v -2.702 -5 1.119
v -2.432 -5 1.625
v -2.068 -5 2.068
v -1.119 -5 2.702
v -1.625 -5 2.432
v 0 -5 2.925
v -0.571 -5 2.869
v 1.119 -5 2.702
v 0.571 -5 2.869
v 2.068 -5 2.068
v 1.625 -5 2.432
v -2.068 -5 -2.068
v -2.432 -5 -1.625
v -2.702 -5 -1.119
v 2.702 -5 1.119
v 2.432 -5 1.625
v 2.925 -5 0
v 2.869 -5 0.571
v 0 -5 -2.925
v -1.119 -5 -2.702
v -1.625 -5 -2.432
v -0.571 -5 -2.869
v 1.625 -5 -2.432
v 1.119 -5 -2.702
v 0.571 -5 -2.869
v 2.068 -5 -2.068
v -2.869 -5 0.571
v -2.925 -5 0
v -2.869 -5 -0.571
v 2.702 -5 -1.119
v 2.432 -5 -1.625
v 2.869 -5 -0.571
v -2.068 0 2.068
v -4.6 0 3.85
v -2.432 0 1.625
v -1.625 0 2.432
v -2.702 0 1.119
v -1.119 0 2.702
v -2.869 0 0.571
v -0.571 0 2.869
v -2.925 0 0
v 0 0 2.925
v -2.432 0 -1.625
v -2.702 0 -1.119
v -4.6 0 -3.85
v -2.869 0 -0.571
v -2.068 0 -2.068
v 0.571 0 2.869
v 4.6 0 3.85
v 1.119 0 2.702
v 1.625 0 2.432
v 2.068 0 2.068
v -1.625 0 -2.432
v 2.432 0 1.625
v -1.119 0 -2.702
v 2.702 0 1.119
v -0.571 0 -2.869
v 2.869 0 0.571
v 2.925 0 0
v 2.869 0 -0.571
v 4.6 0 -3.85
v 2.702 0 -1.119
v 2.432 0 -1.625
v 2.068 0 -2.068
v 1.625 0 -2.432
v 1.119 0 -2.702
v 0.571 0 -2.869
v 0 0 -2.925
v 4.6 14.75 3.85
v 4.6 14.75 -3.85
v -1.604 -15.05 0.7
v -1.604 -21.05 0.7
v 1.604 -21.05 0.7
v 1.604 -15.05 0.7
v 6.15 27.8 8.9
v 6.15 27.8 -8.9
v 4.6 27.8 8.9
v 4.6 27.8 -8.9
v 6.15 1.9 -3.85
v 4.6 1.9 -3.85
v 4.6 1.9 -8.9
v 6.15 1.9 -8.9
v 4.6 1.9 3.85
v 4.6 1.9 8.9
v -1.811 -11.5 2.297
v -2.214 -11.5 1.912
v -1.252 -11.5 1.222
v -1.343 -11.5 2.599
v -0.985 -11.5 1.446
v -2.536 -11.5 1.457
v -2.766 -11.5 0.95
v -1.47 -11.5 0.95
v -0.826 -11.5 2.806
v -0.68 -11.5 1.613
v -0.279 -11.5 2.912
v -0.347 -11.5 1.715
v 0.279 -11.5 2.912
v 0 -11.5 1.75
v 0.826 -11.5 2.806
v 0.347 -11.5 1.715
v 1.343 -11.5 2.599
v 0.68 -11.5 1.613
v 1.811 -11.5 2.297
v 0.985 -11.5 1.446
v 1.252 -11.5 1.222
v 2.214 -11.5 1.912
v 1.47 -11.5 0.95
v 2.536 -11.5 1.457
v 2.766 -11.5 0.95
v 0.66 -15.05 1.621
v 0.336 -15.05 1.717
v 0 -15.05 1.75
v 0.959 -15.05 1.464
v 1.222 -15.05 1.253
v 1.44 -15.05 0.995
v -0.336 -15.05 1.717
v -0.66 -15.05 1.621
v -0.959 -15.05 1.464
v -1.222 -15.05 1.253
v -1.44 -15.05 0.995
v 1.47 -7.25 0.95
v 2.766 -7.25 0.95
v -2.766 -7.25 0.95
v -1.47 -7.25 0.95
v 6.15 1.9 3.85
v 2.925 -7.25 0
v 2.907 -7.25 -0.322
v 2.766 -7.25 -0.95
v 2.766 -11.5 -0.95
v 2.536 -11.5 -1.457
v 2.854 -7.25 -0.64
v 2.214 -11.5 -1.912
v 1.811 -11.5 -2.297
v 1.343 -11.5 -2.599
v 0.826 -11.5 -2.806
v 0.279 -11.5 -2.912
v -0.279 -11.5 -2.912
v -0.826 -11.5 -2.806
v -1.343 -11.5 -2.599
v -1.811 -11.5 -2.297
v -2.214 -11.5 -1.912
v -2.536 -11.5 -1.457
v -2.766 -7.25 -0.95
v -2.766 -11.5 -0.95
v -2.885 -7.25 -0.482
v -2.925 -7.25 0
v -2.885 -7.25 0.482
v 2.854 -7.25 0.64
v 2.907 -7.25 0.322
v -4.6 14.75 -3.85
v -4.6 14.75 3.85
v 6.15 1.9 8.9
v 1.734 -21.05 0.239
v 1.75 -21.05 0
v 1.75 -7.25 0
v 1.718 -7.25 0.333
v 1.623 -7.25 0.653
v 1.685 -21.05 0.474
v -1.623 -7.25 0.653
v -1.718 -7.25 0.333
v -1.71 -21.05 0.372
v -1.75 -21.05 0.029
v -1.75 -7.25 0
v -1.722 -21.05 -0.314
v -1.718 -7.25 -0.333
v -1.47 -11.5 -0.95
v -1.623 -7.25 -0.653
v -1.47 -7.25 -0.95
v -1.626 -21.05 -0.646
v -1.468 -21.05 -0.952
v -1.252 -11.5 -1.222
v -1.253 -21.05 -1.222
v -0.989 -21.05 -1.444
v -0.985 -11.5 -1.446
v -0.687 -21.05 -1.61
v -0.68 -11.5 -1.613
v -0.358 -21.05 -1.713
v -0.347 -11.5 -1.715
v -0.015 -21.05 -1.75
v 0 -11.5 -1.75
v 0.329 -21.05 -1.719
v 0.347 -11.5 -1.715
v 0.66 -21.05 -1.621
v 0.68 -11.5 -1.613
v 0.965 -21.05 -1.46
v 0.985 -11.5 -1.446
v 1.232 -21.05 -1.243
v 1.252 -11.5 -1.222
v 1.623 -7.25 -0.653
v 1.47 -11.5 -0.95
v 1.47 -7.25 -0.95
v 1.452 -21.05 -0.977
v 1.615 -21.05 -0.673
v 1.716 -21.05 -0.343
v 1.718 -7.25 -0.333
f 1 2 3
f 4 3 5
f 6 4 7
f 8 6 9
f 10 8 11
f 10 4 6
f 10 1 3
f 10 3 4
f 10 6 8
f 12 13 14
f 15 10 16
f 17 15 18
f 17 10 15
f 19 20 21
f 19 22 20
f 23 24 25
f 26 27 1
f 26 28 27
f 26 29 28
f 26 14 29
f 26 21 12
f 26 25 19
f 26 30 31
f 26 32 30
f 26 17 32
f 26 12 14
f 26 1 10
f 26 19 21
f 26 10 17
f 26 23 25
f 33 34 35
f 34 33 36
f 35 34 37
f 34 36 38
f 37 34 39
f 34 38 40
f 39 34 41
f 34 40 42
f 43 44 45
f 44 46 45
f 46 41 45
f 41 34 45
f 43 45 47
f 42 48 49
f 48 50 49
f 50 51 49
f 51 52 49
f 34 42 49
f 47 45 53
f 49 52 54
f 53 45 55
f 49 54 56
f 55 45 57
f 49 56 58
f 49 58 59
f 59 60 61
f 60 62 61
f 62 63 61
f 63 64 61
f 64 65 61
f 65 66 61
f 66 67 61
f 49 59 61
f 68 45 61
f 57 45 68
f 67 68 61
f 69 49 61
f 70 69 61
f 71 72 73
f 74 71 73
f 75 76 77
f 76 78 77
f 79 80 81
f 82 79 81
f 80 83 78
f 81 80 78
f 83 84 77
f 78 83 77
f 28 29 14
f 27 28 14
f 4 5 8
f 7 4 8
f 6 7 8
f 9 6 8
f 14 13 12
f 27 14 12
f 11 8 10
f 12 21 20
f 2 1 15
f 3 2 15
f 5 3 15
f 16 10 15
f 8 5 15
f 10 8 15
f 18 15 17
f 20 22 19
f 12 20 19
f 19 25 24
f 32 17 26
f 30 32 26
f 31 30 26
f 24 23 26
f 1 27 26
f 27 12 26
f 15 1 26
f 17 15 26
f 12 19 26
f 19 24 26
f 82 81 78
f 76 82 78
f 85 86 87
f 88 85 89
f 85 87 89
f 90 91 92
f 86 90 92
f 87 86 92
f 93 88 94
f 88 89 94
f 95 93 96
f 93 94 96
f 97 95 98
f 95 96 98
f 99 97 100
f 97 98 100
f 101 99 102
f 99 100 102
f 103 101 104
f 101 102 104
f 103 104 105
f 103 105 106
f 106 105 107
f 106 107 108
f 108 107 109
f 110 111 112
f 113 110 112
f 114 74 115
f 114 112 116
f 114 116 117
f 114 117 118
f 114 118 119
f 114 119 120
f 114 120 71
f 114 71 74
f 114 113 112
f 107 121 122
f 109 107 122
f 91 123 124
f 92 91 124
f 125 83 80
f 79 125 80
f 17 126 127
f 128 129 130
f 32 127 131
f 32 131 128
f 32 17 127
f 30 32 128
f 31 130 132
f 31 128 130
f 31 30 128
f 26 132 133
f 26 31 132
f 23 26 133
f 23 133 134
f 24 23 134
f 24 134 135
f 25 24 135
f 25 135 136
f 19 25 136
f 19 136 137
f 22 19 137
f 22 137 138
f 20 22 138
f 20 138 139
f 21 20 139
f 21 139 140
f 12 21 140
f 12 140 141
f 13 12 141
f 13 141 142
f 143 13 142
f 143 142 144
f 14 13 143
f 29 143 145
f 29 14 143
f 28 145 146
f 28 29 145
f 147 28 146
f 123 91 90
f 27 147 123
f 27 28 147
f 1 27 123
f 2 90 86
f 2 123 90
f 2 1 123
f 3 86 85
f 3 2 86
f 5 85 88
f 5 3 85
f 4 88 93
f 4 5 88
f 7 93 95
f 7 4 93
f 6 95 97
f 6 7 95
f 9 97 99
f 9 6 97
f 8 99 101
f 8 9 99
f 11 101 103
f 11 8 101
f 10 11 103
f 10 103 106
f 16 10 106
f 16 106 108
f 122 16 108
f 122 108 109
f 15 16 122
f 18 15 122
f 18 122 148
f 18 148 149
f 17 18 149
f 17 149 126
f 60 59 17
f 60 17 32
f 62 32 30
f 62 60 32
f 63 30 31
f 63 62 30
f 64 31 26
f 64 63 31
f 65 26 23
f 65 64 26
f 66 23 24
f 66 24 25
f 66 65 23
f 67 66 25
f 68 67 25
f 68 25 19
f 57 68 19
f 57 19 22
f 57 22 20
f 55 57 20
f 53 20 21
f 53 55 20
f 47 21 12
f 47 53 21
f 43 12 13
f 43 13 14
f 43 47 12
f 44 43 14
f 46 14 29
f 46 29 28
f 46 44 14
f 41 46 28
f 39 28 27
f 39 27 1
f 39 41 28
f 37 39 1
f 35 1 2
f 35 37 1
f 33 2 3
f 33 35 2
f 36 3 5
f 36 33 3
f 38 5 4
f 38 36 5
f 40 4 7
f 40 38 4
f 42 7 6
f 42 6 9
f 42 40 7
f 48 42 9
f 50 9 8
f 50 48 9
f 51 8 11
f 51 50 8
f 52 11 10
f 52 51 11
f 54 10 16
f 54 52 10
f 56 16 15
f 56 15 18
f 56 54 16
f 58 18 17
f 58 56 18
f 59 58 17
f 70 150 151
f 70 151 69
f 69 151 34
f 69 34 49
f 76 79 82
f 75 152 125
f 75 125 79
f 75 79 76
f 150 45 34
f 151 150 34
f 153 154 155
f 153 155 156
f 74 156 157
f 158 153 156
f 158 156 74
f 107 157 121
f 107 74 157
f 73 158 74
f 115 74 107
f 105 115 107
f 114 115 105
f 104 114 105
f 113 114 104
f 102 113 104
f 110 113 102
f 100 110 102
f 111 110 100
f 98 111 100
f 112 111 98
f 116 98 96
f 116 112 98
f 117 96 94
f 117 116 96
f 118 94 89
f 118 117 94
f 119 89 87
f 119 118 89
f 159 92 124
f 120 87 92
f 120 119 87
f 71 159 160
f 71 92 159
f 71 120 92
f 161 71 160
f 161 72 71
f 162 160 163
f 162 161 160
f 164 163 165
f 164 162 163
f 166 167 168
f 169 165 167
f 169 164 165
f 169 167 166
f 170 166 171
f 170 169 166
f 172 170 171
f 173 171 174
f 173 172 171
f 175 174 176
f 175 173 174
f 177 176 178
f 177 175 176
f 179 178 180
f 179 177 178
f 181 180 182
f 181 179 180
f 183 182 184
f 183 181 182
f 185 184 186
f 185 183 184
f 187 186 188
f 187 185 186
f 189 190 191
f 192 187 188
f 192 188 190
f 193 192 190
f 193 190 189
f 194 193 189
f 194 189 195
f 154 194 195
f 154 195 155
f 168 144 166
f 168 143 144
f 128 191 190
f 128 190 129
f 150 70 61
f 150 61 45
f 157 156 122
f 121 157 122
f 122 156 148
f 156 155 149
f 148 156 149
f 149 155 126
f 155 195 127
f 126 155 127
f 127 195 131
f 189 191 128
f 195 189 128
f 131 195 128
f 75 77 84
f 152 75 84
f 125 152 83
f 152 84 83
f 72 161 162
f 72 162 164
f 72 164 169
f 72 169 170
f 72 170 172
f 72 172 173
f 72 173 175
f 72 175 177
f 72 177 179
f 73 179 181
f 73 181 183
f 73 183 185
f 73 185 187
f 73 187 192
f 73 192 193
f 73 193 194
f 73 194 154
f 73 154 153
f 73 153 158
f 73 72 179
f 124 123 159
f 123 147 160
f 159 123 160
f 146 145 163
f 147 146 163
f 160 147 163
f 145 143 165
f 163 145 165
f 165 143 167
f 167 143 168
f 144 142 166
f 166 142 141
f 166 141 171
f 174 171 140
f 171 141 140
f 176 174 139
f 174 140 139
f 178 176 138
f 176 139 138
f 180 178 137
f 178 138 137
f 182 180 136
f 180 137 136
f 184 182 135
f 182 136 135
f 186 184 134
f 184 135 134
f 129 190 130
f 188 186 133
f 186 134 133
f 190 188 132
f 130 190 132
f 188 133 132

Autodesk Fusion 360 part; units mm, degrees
sketch "Profile" plane through (0, 0, 0) normal (0, 1, 0) x (1, 0, 0)
  line L0 (4.6, 3.85) -> (-4.6, 3.85)
  line L1 (-4.6, 3.85) -> (-4.6, -3.85)
  line L2 (-4.6, -3.85) -> (4.6, -3.85)
  line L3 (4.6, -3.85) -> (4.6, 3.85)
  line L4 (4.6, 3.85) -> (-4.6, -3.85) construction
  line L5 (-4.6, 3.85) -> (4.6, -3.85) construction
  circle A0 centre (0, 0) radius 2.925
  line L6 (2.235, -1.8869) -> (2.235, 1.8869)
  line L7 (0, 0) -> (0, 6.159) construction
  line L8 (-2.235, -1.8869) -> (-2.235, 1.8869)
  line L9 (-2.7664, -0.95) -> (2.7664, -0.95)
  line L10 (0, 0) -> (1.3963, 0) construction
  line L11 (-2.7664, 0.95) -> (2.7664, 0.95)
  dimension "d1" = 9.2
  dimension "d2" = 7.7
  dimension "d3" = 5.85
  dimension "d17" = 2.235
  dimension "d18" = 0.95
extrude "Extrude1" add sketch "Profile" along normal blind 14.75 contours L0 L1 L2 L3 | A0 L6 L9 L11 | A0 L6 L11 | A0 L6 L9 | A0 L6 L8 L11 | L6 L8 L9 L11 | A0 L6 L8 L9 | A0 L8 L11 | A0 L8 L9 L11 | A0 L8 L9 makes body 1
extrude "Extrude2" add sketch "Profile" against normal blind 5 contours A0 L6 L9 L11 | A0 L6 L11 | A0 L6 L9 | A0 L6 L8 L11 | L6 L8 L9 L11 | A0 L6 L8 L9 | A0 L8 L11 | A0 L8 L9 L11 | A0 L8 L9 bodies 1
extrude "Extrude3" add sketch "Profile" against normal blind 6.5 from surface at -5 separate body contours A0 L6 L11 | A0 L6 L9 | A0 L6 L8 L11 | A0 L6 L8 L9 | A0 L8 L11 | A0 L8 L9 makes body 2 at (1.1749, -9.3333, -2.6787) makes body 3 at (-1.1749, -9.3333, 2.6787)
extrude "Extrude5" add sketch "Profile" against normal blind 2.25 from surface at -5 separate body contours A0 L6 L9 L11 | L6 L8 L9 L11 | A0 L8 L9 L11 makes body 4
combine "Combine1" operation add target body 3 tool bodies 4 2
cylinder "CylinderPrimitive1" add diameter 3.5 height 9.55 placed x (1, 0, 0) y (0, 0, 1) z (0, -1, 0) at (0, -11.5, 0) bodies 3
sketch "PCB" plane through (4.6, 0, 0) normal (1, 0, 0) x (0, 1, 0)
  line L0 (0, 3.85) -> (0, -3.85)
  line L1 (0, -3.85) -> (14.75, -3.85)
  line L2 (14.75, -3.85) -> (14.75, 3.85)
  line L3 (14.75, 3.85) -> (0, 3.85)
  line L4 (27.8, 8.9) -> (1.9, 8.9)
  line L5 (1.9, 8.9) -> (1.9, -8.9)
  line L6 (1.9, -8.9) -> (27.8, -8.9)
  line L7 (27.8, -8.9) -> (27.8, 8.9)
  line L8 (27.8, 8.9) -> (1.9, -8.9) construction
  line L9 (1.9, 8.9) -> (27.8, -8.9) construction
  point P0 (14.85, 0)
  dimension "d12" = 25.9
  dimension "d13" = 17.8
  dimension "d14" = 1.9
extrude "Extrude4" add sketch "PCB" along normal blind 1.55 separate body contours L1 L2 L3 L4 L5 L6 L7 | L1 L2 L3 L5 makes body 5
extrude "Extrude6" add 1 faces at (-0.4497, -11.5, 0.2434) along direction (0, 1, 0) up to surface (4.25 mm away) on bodies 3 bodies 3
sketch "Sketch4" plane through (0, -21.05, 0) normal (0, -1, 0) x (1, 0, 0)
  circle A0 centre (0, 0) radius 1.75
  line L0 (-1.6039, 0.7) -> (1.6039, 0.7)
  dimension "d25" = 2.45
extrude "Extrude7" cut sketch "Sketch4" against normal blind 6 contours A0 L0 picked at (-0.2322, 1.2474) bodies 3
equation "d17 = ( 4.47 / 2 ) * 1 mm"
equation "d18 = ( 1.9 / 2 ) * 1 mm"
